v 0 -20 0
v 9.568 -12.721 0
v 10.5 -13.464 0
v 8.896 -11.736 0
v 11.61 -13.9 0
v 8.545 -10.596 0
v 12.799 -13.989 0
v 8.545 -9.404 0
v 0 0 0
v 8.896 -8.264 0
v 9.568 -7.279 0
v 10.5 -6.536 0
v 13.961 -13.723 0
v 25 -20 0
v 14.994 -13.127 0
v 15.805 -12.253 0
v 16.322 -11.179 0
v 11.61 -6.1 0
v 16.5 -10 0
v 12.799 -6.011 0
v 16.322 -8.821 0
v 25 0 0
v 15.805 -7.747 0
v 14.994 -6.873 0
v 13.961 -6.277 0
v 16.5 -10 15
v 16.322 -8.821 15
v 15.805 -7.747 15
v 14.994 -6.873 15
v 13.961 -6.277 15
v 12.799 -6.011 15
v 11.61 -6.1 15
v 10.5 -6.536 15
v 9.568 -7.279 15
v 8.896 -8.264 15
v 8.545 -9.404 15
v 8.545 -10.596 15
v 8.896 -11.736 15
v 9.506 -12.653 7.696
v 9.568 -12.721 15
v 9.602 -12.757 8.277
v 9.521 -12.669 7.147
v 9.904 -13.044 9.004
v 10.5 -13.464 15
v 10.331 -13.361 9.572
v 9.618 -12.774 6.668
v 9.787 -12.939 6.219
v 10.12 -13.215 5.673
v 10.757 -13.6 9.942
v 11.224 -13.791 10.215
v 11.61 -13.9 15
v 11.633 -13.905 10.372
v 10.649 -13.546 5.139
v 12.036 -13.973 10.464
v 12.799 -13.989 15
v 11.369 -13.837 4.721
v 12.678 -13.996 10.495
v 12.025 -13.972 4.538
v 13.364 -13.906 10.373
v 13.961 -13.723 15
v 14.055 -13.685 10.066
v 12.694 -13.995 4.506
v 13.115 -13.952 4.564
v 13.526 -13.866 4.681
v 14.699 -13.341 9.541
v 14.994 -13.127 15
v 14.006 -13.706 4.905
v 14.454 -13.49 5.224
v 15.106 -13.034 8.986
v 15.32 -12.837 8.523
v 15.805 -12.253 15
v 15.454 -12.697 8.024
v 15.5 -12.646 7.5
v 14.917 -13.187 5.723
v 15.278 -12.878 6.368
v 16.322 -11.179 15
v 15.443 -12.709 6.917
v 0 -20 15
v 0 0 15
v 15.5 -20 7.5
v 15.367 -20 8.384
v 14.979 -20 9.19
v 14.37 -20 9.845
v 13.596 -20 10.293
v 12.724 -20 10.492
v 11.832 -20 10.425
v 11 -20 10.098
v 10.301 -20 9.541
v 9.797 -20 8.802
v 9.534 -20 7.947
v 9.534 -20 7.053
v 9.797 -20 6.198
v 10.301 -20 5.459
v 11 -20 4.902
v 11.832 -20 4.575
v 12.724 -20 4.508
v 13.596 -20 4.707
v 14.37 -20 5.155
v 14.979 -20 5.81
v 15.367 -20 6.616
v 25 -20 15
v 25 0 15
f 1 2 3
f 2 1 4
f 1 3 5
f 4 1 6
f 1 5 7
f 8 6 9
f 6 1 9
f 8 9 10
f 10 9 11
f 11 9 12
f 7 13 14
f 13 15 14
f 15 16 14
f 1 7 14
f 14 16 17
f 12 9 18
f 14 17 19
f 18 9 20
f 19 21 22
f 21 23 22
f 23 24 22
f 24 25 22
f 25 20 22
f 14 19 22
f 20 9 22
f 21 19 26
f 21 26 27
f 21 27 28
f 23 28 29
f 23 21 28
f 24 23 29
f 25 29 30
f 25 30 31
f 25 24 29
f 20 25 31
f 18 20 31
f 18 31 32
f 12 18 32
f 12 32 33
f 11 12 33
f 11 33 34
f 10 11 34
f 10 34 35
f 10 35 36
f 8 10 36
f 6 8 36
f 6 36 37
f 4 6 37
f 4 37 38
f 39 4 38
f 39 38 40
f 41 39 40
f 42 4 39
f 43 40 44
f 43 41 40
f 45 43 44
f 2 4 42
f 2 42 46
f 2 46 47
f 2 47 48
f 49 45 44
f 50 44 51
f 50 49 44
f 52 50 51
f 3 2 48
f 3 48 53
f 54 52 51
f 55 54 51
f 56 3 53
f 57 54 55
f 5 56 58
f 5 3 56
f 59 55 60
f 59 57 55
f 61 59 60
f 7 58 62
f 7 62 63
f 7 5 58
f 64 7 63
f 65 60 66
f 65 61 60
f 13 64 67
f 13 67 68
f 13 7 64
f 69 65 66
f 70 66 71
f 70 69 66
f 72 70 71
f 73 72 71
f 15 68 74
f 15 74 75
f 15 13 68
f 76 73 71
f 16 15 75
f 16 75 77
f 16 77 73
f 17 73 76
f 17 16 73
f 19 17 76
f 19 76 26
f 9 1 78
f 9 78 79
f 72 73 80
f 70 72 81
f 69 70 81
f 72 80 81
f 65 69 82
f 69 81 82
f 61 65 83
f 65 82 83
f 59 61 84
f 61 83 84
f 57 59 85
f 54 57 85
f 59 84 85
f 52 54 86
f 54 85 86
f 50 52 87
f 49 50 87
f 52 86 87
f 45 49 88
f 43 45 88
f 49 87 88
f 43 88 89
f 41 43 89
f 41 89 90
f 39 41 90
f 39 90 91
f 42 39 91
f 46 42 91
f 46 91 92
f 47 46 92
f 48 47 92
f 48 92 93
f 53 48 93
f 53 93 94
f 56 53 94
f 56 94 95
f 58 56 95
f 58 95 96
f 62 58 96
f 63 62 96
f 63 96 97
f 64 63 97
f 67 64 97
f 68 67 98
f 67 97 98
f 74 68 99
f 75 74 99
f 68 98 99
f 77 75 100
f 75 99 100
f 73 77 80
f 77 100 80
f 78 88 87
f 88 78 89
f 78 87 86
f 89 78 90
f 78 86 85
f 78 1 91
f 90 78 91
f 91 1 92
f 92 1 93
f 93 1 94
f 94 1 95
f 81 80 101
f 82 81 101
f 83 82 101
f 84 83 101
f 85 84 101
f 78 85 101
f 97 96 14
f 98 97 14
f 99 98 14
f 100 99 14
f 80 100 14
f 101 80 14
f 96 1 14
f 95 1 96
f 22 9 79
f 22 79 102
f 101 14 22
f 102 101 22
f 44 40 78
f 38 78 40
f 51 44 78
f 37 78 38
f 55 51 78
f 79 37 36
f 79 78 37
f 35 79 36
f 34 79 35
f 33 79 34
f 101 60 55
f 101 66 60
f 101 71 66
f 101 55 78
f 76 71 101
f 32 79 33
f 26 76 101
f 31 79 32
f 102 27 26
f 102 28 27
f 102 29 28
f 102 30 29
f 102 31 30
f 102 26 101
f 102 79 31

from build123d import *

# Parameters (mm, degrees)
F0_W     = 25
F0_H     = 20
F0_R     = 4
F1_DEPTH = 15
F2_R     = 3
F3_DEPTH = 10


with BuildPart() as f1:
    # F0 (on Top) → F1 (new body)
    with BuildSketch(Plane.XY):
        with Locations((12.5, -10)):
            Rectangle(F0_W, F0_H)
        with Locations((12.5, -10)):
            Circle(F0_R, mode=Mode.SUBTRACT)
    extrude(amount=F1_DEPTH)

    # F2 (on face) → F3 (cut)
    with BuildSketch(Plane.XZ.offset(20)):
        with Locations((12.5, 7.5)):
            Circle(F2_R)
    extrude(amount=-F3_DEPTH, mode=Mode.SUBTRACT)


solid = f1.part
